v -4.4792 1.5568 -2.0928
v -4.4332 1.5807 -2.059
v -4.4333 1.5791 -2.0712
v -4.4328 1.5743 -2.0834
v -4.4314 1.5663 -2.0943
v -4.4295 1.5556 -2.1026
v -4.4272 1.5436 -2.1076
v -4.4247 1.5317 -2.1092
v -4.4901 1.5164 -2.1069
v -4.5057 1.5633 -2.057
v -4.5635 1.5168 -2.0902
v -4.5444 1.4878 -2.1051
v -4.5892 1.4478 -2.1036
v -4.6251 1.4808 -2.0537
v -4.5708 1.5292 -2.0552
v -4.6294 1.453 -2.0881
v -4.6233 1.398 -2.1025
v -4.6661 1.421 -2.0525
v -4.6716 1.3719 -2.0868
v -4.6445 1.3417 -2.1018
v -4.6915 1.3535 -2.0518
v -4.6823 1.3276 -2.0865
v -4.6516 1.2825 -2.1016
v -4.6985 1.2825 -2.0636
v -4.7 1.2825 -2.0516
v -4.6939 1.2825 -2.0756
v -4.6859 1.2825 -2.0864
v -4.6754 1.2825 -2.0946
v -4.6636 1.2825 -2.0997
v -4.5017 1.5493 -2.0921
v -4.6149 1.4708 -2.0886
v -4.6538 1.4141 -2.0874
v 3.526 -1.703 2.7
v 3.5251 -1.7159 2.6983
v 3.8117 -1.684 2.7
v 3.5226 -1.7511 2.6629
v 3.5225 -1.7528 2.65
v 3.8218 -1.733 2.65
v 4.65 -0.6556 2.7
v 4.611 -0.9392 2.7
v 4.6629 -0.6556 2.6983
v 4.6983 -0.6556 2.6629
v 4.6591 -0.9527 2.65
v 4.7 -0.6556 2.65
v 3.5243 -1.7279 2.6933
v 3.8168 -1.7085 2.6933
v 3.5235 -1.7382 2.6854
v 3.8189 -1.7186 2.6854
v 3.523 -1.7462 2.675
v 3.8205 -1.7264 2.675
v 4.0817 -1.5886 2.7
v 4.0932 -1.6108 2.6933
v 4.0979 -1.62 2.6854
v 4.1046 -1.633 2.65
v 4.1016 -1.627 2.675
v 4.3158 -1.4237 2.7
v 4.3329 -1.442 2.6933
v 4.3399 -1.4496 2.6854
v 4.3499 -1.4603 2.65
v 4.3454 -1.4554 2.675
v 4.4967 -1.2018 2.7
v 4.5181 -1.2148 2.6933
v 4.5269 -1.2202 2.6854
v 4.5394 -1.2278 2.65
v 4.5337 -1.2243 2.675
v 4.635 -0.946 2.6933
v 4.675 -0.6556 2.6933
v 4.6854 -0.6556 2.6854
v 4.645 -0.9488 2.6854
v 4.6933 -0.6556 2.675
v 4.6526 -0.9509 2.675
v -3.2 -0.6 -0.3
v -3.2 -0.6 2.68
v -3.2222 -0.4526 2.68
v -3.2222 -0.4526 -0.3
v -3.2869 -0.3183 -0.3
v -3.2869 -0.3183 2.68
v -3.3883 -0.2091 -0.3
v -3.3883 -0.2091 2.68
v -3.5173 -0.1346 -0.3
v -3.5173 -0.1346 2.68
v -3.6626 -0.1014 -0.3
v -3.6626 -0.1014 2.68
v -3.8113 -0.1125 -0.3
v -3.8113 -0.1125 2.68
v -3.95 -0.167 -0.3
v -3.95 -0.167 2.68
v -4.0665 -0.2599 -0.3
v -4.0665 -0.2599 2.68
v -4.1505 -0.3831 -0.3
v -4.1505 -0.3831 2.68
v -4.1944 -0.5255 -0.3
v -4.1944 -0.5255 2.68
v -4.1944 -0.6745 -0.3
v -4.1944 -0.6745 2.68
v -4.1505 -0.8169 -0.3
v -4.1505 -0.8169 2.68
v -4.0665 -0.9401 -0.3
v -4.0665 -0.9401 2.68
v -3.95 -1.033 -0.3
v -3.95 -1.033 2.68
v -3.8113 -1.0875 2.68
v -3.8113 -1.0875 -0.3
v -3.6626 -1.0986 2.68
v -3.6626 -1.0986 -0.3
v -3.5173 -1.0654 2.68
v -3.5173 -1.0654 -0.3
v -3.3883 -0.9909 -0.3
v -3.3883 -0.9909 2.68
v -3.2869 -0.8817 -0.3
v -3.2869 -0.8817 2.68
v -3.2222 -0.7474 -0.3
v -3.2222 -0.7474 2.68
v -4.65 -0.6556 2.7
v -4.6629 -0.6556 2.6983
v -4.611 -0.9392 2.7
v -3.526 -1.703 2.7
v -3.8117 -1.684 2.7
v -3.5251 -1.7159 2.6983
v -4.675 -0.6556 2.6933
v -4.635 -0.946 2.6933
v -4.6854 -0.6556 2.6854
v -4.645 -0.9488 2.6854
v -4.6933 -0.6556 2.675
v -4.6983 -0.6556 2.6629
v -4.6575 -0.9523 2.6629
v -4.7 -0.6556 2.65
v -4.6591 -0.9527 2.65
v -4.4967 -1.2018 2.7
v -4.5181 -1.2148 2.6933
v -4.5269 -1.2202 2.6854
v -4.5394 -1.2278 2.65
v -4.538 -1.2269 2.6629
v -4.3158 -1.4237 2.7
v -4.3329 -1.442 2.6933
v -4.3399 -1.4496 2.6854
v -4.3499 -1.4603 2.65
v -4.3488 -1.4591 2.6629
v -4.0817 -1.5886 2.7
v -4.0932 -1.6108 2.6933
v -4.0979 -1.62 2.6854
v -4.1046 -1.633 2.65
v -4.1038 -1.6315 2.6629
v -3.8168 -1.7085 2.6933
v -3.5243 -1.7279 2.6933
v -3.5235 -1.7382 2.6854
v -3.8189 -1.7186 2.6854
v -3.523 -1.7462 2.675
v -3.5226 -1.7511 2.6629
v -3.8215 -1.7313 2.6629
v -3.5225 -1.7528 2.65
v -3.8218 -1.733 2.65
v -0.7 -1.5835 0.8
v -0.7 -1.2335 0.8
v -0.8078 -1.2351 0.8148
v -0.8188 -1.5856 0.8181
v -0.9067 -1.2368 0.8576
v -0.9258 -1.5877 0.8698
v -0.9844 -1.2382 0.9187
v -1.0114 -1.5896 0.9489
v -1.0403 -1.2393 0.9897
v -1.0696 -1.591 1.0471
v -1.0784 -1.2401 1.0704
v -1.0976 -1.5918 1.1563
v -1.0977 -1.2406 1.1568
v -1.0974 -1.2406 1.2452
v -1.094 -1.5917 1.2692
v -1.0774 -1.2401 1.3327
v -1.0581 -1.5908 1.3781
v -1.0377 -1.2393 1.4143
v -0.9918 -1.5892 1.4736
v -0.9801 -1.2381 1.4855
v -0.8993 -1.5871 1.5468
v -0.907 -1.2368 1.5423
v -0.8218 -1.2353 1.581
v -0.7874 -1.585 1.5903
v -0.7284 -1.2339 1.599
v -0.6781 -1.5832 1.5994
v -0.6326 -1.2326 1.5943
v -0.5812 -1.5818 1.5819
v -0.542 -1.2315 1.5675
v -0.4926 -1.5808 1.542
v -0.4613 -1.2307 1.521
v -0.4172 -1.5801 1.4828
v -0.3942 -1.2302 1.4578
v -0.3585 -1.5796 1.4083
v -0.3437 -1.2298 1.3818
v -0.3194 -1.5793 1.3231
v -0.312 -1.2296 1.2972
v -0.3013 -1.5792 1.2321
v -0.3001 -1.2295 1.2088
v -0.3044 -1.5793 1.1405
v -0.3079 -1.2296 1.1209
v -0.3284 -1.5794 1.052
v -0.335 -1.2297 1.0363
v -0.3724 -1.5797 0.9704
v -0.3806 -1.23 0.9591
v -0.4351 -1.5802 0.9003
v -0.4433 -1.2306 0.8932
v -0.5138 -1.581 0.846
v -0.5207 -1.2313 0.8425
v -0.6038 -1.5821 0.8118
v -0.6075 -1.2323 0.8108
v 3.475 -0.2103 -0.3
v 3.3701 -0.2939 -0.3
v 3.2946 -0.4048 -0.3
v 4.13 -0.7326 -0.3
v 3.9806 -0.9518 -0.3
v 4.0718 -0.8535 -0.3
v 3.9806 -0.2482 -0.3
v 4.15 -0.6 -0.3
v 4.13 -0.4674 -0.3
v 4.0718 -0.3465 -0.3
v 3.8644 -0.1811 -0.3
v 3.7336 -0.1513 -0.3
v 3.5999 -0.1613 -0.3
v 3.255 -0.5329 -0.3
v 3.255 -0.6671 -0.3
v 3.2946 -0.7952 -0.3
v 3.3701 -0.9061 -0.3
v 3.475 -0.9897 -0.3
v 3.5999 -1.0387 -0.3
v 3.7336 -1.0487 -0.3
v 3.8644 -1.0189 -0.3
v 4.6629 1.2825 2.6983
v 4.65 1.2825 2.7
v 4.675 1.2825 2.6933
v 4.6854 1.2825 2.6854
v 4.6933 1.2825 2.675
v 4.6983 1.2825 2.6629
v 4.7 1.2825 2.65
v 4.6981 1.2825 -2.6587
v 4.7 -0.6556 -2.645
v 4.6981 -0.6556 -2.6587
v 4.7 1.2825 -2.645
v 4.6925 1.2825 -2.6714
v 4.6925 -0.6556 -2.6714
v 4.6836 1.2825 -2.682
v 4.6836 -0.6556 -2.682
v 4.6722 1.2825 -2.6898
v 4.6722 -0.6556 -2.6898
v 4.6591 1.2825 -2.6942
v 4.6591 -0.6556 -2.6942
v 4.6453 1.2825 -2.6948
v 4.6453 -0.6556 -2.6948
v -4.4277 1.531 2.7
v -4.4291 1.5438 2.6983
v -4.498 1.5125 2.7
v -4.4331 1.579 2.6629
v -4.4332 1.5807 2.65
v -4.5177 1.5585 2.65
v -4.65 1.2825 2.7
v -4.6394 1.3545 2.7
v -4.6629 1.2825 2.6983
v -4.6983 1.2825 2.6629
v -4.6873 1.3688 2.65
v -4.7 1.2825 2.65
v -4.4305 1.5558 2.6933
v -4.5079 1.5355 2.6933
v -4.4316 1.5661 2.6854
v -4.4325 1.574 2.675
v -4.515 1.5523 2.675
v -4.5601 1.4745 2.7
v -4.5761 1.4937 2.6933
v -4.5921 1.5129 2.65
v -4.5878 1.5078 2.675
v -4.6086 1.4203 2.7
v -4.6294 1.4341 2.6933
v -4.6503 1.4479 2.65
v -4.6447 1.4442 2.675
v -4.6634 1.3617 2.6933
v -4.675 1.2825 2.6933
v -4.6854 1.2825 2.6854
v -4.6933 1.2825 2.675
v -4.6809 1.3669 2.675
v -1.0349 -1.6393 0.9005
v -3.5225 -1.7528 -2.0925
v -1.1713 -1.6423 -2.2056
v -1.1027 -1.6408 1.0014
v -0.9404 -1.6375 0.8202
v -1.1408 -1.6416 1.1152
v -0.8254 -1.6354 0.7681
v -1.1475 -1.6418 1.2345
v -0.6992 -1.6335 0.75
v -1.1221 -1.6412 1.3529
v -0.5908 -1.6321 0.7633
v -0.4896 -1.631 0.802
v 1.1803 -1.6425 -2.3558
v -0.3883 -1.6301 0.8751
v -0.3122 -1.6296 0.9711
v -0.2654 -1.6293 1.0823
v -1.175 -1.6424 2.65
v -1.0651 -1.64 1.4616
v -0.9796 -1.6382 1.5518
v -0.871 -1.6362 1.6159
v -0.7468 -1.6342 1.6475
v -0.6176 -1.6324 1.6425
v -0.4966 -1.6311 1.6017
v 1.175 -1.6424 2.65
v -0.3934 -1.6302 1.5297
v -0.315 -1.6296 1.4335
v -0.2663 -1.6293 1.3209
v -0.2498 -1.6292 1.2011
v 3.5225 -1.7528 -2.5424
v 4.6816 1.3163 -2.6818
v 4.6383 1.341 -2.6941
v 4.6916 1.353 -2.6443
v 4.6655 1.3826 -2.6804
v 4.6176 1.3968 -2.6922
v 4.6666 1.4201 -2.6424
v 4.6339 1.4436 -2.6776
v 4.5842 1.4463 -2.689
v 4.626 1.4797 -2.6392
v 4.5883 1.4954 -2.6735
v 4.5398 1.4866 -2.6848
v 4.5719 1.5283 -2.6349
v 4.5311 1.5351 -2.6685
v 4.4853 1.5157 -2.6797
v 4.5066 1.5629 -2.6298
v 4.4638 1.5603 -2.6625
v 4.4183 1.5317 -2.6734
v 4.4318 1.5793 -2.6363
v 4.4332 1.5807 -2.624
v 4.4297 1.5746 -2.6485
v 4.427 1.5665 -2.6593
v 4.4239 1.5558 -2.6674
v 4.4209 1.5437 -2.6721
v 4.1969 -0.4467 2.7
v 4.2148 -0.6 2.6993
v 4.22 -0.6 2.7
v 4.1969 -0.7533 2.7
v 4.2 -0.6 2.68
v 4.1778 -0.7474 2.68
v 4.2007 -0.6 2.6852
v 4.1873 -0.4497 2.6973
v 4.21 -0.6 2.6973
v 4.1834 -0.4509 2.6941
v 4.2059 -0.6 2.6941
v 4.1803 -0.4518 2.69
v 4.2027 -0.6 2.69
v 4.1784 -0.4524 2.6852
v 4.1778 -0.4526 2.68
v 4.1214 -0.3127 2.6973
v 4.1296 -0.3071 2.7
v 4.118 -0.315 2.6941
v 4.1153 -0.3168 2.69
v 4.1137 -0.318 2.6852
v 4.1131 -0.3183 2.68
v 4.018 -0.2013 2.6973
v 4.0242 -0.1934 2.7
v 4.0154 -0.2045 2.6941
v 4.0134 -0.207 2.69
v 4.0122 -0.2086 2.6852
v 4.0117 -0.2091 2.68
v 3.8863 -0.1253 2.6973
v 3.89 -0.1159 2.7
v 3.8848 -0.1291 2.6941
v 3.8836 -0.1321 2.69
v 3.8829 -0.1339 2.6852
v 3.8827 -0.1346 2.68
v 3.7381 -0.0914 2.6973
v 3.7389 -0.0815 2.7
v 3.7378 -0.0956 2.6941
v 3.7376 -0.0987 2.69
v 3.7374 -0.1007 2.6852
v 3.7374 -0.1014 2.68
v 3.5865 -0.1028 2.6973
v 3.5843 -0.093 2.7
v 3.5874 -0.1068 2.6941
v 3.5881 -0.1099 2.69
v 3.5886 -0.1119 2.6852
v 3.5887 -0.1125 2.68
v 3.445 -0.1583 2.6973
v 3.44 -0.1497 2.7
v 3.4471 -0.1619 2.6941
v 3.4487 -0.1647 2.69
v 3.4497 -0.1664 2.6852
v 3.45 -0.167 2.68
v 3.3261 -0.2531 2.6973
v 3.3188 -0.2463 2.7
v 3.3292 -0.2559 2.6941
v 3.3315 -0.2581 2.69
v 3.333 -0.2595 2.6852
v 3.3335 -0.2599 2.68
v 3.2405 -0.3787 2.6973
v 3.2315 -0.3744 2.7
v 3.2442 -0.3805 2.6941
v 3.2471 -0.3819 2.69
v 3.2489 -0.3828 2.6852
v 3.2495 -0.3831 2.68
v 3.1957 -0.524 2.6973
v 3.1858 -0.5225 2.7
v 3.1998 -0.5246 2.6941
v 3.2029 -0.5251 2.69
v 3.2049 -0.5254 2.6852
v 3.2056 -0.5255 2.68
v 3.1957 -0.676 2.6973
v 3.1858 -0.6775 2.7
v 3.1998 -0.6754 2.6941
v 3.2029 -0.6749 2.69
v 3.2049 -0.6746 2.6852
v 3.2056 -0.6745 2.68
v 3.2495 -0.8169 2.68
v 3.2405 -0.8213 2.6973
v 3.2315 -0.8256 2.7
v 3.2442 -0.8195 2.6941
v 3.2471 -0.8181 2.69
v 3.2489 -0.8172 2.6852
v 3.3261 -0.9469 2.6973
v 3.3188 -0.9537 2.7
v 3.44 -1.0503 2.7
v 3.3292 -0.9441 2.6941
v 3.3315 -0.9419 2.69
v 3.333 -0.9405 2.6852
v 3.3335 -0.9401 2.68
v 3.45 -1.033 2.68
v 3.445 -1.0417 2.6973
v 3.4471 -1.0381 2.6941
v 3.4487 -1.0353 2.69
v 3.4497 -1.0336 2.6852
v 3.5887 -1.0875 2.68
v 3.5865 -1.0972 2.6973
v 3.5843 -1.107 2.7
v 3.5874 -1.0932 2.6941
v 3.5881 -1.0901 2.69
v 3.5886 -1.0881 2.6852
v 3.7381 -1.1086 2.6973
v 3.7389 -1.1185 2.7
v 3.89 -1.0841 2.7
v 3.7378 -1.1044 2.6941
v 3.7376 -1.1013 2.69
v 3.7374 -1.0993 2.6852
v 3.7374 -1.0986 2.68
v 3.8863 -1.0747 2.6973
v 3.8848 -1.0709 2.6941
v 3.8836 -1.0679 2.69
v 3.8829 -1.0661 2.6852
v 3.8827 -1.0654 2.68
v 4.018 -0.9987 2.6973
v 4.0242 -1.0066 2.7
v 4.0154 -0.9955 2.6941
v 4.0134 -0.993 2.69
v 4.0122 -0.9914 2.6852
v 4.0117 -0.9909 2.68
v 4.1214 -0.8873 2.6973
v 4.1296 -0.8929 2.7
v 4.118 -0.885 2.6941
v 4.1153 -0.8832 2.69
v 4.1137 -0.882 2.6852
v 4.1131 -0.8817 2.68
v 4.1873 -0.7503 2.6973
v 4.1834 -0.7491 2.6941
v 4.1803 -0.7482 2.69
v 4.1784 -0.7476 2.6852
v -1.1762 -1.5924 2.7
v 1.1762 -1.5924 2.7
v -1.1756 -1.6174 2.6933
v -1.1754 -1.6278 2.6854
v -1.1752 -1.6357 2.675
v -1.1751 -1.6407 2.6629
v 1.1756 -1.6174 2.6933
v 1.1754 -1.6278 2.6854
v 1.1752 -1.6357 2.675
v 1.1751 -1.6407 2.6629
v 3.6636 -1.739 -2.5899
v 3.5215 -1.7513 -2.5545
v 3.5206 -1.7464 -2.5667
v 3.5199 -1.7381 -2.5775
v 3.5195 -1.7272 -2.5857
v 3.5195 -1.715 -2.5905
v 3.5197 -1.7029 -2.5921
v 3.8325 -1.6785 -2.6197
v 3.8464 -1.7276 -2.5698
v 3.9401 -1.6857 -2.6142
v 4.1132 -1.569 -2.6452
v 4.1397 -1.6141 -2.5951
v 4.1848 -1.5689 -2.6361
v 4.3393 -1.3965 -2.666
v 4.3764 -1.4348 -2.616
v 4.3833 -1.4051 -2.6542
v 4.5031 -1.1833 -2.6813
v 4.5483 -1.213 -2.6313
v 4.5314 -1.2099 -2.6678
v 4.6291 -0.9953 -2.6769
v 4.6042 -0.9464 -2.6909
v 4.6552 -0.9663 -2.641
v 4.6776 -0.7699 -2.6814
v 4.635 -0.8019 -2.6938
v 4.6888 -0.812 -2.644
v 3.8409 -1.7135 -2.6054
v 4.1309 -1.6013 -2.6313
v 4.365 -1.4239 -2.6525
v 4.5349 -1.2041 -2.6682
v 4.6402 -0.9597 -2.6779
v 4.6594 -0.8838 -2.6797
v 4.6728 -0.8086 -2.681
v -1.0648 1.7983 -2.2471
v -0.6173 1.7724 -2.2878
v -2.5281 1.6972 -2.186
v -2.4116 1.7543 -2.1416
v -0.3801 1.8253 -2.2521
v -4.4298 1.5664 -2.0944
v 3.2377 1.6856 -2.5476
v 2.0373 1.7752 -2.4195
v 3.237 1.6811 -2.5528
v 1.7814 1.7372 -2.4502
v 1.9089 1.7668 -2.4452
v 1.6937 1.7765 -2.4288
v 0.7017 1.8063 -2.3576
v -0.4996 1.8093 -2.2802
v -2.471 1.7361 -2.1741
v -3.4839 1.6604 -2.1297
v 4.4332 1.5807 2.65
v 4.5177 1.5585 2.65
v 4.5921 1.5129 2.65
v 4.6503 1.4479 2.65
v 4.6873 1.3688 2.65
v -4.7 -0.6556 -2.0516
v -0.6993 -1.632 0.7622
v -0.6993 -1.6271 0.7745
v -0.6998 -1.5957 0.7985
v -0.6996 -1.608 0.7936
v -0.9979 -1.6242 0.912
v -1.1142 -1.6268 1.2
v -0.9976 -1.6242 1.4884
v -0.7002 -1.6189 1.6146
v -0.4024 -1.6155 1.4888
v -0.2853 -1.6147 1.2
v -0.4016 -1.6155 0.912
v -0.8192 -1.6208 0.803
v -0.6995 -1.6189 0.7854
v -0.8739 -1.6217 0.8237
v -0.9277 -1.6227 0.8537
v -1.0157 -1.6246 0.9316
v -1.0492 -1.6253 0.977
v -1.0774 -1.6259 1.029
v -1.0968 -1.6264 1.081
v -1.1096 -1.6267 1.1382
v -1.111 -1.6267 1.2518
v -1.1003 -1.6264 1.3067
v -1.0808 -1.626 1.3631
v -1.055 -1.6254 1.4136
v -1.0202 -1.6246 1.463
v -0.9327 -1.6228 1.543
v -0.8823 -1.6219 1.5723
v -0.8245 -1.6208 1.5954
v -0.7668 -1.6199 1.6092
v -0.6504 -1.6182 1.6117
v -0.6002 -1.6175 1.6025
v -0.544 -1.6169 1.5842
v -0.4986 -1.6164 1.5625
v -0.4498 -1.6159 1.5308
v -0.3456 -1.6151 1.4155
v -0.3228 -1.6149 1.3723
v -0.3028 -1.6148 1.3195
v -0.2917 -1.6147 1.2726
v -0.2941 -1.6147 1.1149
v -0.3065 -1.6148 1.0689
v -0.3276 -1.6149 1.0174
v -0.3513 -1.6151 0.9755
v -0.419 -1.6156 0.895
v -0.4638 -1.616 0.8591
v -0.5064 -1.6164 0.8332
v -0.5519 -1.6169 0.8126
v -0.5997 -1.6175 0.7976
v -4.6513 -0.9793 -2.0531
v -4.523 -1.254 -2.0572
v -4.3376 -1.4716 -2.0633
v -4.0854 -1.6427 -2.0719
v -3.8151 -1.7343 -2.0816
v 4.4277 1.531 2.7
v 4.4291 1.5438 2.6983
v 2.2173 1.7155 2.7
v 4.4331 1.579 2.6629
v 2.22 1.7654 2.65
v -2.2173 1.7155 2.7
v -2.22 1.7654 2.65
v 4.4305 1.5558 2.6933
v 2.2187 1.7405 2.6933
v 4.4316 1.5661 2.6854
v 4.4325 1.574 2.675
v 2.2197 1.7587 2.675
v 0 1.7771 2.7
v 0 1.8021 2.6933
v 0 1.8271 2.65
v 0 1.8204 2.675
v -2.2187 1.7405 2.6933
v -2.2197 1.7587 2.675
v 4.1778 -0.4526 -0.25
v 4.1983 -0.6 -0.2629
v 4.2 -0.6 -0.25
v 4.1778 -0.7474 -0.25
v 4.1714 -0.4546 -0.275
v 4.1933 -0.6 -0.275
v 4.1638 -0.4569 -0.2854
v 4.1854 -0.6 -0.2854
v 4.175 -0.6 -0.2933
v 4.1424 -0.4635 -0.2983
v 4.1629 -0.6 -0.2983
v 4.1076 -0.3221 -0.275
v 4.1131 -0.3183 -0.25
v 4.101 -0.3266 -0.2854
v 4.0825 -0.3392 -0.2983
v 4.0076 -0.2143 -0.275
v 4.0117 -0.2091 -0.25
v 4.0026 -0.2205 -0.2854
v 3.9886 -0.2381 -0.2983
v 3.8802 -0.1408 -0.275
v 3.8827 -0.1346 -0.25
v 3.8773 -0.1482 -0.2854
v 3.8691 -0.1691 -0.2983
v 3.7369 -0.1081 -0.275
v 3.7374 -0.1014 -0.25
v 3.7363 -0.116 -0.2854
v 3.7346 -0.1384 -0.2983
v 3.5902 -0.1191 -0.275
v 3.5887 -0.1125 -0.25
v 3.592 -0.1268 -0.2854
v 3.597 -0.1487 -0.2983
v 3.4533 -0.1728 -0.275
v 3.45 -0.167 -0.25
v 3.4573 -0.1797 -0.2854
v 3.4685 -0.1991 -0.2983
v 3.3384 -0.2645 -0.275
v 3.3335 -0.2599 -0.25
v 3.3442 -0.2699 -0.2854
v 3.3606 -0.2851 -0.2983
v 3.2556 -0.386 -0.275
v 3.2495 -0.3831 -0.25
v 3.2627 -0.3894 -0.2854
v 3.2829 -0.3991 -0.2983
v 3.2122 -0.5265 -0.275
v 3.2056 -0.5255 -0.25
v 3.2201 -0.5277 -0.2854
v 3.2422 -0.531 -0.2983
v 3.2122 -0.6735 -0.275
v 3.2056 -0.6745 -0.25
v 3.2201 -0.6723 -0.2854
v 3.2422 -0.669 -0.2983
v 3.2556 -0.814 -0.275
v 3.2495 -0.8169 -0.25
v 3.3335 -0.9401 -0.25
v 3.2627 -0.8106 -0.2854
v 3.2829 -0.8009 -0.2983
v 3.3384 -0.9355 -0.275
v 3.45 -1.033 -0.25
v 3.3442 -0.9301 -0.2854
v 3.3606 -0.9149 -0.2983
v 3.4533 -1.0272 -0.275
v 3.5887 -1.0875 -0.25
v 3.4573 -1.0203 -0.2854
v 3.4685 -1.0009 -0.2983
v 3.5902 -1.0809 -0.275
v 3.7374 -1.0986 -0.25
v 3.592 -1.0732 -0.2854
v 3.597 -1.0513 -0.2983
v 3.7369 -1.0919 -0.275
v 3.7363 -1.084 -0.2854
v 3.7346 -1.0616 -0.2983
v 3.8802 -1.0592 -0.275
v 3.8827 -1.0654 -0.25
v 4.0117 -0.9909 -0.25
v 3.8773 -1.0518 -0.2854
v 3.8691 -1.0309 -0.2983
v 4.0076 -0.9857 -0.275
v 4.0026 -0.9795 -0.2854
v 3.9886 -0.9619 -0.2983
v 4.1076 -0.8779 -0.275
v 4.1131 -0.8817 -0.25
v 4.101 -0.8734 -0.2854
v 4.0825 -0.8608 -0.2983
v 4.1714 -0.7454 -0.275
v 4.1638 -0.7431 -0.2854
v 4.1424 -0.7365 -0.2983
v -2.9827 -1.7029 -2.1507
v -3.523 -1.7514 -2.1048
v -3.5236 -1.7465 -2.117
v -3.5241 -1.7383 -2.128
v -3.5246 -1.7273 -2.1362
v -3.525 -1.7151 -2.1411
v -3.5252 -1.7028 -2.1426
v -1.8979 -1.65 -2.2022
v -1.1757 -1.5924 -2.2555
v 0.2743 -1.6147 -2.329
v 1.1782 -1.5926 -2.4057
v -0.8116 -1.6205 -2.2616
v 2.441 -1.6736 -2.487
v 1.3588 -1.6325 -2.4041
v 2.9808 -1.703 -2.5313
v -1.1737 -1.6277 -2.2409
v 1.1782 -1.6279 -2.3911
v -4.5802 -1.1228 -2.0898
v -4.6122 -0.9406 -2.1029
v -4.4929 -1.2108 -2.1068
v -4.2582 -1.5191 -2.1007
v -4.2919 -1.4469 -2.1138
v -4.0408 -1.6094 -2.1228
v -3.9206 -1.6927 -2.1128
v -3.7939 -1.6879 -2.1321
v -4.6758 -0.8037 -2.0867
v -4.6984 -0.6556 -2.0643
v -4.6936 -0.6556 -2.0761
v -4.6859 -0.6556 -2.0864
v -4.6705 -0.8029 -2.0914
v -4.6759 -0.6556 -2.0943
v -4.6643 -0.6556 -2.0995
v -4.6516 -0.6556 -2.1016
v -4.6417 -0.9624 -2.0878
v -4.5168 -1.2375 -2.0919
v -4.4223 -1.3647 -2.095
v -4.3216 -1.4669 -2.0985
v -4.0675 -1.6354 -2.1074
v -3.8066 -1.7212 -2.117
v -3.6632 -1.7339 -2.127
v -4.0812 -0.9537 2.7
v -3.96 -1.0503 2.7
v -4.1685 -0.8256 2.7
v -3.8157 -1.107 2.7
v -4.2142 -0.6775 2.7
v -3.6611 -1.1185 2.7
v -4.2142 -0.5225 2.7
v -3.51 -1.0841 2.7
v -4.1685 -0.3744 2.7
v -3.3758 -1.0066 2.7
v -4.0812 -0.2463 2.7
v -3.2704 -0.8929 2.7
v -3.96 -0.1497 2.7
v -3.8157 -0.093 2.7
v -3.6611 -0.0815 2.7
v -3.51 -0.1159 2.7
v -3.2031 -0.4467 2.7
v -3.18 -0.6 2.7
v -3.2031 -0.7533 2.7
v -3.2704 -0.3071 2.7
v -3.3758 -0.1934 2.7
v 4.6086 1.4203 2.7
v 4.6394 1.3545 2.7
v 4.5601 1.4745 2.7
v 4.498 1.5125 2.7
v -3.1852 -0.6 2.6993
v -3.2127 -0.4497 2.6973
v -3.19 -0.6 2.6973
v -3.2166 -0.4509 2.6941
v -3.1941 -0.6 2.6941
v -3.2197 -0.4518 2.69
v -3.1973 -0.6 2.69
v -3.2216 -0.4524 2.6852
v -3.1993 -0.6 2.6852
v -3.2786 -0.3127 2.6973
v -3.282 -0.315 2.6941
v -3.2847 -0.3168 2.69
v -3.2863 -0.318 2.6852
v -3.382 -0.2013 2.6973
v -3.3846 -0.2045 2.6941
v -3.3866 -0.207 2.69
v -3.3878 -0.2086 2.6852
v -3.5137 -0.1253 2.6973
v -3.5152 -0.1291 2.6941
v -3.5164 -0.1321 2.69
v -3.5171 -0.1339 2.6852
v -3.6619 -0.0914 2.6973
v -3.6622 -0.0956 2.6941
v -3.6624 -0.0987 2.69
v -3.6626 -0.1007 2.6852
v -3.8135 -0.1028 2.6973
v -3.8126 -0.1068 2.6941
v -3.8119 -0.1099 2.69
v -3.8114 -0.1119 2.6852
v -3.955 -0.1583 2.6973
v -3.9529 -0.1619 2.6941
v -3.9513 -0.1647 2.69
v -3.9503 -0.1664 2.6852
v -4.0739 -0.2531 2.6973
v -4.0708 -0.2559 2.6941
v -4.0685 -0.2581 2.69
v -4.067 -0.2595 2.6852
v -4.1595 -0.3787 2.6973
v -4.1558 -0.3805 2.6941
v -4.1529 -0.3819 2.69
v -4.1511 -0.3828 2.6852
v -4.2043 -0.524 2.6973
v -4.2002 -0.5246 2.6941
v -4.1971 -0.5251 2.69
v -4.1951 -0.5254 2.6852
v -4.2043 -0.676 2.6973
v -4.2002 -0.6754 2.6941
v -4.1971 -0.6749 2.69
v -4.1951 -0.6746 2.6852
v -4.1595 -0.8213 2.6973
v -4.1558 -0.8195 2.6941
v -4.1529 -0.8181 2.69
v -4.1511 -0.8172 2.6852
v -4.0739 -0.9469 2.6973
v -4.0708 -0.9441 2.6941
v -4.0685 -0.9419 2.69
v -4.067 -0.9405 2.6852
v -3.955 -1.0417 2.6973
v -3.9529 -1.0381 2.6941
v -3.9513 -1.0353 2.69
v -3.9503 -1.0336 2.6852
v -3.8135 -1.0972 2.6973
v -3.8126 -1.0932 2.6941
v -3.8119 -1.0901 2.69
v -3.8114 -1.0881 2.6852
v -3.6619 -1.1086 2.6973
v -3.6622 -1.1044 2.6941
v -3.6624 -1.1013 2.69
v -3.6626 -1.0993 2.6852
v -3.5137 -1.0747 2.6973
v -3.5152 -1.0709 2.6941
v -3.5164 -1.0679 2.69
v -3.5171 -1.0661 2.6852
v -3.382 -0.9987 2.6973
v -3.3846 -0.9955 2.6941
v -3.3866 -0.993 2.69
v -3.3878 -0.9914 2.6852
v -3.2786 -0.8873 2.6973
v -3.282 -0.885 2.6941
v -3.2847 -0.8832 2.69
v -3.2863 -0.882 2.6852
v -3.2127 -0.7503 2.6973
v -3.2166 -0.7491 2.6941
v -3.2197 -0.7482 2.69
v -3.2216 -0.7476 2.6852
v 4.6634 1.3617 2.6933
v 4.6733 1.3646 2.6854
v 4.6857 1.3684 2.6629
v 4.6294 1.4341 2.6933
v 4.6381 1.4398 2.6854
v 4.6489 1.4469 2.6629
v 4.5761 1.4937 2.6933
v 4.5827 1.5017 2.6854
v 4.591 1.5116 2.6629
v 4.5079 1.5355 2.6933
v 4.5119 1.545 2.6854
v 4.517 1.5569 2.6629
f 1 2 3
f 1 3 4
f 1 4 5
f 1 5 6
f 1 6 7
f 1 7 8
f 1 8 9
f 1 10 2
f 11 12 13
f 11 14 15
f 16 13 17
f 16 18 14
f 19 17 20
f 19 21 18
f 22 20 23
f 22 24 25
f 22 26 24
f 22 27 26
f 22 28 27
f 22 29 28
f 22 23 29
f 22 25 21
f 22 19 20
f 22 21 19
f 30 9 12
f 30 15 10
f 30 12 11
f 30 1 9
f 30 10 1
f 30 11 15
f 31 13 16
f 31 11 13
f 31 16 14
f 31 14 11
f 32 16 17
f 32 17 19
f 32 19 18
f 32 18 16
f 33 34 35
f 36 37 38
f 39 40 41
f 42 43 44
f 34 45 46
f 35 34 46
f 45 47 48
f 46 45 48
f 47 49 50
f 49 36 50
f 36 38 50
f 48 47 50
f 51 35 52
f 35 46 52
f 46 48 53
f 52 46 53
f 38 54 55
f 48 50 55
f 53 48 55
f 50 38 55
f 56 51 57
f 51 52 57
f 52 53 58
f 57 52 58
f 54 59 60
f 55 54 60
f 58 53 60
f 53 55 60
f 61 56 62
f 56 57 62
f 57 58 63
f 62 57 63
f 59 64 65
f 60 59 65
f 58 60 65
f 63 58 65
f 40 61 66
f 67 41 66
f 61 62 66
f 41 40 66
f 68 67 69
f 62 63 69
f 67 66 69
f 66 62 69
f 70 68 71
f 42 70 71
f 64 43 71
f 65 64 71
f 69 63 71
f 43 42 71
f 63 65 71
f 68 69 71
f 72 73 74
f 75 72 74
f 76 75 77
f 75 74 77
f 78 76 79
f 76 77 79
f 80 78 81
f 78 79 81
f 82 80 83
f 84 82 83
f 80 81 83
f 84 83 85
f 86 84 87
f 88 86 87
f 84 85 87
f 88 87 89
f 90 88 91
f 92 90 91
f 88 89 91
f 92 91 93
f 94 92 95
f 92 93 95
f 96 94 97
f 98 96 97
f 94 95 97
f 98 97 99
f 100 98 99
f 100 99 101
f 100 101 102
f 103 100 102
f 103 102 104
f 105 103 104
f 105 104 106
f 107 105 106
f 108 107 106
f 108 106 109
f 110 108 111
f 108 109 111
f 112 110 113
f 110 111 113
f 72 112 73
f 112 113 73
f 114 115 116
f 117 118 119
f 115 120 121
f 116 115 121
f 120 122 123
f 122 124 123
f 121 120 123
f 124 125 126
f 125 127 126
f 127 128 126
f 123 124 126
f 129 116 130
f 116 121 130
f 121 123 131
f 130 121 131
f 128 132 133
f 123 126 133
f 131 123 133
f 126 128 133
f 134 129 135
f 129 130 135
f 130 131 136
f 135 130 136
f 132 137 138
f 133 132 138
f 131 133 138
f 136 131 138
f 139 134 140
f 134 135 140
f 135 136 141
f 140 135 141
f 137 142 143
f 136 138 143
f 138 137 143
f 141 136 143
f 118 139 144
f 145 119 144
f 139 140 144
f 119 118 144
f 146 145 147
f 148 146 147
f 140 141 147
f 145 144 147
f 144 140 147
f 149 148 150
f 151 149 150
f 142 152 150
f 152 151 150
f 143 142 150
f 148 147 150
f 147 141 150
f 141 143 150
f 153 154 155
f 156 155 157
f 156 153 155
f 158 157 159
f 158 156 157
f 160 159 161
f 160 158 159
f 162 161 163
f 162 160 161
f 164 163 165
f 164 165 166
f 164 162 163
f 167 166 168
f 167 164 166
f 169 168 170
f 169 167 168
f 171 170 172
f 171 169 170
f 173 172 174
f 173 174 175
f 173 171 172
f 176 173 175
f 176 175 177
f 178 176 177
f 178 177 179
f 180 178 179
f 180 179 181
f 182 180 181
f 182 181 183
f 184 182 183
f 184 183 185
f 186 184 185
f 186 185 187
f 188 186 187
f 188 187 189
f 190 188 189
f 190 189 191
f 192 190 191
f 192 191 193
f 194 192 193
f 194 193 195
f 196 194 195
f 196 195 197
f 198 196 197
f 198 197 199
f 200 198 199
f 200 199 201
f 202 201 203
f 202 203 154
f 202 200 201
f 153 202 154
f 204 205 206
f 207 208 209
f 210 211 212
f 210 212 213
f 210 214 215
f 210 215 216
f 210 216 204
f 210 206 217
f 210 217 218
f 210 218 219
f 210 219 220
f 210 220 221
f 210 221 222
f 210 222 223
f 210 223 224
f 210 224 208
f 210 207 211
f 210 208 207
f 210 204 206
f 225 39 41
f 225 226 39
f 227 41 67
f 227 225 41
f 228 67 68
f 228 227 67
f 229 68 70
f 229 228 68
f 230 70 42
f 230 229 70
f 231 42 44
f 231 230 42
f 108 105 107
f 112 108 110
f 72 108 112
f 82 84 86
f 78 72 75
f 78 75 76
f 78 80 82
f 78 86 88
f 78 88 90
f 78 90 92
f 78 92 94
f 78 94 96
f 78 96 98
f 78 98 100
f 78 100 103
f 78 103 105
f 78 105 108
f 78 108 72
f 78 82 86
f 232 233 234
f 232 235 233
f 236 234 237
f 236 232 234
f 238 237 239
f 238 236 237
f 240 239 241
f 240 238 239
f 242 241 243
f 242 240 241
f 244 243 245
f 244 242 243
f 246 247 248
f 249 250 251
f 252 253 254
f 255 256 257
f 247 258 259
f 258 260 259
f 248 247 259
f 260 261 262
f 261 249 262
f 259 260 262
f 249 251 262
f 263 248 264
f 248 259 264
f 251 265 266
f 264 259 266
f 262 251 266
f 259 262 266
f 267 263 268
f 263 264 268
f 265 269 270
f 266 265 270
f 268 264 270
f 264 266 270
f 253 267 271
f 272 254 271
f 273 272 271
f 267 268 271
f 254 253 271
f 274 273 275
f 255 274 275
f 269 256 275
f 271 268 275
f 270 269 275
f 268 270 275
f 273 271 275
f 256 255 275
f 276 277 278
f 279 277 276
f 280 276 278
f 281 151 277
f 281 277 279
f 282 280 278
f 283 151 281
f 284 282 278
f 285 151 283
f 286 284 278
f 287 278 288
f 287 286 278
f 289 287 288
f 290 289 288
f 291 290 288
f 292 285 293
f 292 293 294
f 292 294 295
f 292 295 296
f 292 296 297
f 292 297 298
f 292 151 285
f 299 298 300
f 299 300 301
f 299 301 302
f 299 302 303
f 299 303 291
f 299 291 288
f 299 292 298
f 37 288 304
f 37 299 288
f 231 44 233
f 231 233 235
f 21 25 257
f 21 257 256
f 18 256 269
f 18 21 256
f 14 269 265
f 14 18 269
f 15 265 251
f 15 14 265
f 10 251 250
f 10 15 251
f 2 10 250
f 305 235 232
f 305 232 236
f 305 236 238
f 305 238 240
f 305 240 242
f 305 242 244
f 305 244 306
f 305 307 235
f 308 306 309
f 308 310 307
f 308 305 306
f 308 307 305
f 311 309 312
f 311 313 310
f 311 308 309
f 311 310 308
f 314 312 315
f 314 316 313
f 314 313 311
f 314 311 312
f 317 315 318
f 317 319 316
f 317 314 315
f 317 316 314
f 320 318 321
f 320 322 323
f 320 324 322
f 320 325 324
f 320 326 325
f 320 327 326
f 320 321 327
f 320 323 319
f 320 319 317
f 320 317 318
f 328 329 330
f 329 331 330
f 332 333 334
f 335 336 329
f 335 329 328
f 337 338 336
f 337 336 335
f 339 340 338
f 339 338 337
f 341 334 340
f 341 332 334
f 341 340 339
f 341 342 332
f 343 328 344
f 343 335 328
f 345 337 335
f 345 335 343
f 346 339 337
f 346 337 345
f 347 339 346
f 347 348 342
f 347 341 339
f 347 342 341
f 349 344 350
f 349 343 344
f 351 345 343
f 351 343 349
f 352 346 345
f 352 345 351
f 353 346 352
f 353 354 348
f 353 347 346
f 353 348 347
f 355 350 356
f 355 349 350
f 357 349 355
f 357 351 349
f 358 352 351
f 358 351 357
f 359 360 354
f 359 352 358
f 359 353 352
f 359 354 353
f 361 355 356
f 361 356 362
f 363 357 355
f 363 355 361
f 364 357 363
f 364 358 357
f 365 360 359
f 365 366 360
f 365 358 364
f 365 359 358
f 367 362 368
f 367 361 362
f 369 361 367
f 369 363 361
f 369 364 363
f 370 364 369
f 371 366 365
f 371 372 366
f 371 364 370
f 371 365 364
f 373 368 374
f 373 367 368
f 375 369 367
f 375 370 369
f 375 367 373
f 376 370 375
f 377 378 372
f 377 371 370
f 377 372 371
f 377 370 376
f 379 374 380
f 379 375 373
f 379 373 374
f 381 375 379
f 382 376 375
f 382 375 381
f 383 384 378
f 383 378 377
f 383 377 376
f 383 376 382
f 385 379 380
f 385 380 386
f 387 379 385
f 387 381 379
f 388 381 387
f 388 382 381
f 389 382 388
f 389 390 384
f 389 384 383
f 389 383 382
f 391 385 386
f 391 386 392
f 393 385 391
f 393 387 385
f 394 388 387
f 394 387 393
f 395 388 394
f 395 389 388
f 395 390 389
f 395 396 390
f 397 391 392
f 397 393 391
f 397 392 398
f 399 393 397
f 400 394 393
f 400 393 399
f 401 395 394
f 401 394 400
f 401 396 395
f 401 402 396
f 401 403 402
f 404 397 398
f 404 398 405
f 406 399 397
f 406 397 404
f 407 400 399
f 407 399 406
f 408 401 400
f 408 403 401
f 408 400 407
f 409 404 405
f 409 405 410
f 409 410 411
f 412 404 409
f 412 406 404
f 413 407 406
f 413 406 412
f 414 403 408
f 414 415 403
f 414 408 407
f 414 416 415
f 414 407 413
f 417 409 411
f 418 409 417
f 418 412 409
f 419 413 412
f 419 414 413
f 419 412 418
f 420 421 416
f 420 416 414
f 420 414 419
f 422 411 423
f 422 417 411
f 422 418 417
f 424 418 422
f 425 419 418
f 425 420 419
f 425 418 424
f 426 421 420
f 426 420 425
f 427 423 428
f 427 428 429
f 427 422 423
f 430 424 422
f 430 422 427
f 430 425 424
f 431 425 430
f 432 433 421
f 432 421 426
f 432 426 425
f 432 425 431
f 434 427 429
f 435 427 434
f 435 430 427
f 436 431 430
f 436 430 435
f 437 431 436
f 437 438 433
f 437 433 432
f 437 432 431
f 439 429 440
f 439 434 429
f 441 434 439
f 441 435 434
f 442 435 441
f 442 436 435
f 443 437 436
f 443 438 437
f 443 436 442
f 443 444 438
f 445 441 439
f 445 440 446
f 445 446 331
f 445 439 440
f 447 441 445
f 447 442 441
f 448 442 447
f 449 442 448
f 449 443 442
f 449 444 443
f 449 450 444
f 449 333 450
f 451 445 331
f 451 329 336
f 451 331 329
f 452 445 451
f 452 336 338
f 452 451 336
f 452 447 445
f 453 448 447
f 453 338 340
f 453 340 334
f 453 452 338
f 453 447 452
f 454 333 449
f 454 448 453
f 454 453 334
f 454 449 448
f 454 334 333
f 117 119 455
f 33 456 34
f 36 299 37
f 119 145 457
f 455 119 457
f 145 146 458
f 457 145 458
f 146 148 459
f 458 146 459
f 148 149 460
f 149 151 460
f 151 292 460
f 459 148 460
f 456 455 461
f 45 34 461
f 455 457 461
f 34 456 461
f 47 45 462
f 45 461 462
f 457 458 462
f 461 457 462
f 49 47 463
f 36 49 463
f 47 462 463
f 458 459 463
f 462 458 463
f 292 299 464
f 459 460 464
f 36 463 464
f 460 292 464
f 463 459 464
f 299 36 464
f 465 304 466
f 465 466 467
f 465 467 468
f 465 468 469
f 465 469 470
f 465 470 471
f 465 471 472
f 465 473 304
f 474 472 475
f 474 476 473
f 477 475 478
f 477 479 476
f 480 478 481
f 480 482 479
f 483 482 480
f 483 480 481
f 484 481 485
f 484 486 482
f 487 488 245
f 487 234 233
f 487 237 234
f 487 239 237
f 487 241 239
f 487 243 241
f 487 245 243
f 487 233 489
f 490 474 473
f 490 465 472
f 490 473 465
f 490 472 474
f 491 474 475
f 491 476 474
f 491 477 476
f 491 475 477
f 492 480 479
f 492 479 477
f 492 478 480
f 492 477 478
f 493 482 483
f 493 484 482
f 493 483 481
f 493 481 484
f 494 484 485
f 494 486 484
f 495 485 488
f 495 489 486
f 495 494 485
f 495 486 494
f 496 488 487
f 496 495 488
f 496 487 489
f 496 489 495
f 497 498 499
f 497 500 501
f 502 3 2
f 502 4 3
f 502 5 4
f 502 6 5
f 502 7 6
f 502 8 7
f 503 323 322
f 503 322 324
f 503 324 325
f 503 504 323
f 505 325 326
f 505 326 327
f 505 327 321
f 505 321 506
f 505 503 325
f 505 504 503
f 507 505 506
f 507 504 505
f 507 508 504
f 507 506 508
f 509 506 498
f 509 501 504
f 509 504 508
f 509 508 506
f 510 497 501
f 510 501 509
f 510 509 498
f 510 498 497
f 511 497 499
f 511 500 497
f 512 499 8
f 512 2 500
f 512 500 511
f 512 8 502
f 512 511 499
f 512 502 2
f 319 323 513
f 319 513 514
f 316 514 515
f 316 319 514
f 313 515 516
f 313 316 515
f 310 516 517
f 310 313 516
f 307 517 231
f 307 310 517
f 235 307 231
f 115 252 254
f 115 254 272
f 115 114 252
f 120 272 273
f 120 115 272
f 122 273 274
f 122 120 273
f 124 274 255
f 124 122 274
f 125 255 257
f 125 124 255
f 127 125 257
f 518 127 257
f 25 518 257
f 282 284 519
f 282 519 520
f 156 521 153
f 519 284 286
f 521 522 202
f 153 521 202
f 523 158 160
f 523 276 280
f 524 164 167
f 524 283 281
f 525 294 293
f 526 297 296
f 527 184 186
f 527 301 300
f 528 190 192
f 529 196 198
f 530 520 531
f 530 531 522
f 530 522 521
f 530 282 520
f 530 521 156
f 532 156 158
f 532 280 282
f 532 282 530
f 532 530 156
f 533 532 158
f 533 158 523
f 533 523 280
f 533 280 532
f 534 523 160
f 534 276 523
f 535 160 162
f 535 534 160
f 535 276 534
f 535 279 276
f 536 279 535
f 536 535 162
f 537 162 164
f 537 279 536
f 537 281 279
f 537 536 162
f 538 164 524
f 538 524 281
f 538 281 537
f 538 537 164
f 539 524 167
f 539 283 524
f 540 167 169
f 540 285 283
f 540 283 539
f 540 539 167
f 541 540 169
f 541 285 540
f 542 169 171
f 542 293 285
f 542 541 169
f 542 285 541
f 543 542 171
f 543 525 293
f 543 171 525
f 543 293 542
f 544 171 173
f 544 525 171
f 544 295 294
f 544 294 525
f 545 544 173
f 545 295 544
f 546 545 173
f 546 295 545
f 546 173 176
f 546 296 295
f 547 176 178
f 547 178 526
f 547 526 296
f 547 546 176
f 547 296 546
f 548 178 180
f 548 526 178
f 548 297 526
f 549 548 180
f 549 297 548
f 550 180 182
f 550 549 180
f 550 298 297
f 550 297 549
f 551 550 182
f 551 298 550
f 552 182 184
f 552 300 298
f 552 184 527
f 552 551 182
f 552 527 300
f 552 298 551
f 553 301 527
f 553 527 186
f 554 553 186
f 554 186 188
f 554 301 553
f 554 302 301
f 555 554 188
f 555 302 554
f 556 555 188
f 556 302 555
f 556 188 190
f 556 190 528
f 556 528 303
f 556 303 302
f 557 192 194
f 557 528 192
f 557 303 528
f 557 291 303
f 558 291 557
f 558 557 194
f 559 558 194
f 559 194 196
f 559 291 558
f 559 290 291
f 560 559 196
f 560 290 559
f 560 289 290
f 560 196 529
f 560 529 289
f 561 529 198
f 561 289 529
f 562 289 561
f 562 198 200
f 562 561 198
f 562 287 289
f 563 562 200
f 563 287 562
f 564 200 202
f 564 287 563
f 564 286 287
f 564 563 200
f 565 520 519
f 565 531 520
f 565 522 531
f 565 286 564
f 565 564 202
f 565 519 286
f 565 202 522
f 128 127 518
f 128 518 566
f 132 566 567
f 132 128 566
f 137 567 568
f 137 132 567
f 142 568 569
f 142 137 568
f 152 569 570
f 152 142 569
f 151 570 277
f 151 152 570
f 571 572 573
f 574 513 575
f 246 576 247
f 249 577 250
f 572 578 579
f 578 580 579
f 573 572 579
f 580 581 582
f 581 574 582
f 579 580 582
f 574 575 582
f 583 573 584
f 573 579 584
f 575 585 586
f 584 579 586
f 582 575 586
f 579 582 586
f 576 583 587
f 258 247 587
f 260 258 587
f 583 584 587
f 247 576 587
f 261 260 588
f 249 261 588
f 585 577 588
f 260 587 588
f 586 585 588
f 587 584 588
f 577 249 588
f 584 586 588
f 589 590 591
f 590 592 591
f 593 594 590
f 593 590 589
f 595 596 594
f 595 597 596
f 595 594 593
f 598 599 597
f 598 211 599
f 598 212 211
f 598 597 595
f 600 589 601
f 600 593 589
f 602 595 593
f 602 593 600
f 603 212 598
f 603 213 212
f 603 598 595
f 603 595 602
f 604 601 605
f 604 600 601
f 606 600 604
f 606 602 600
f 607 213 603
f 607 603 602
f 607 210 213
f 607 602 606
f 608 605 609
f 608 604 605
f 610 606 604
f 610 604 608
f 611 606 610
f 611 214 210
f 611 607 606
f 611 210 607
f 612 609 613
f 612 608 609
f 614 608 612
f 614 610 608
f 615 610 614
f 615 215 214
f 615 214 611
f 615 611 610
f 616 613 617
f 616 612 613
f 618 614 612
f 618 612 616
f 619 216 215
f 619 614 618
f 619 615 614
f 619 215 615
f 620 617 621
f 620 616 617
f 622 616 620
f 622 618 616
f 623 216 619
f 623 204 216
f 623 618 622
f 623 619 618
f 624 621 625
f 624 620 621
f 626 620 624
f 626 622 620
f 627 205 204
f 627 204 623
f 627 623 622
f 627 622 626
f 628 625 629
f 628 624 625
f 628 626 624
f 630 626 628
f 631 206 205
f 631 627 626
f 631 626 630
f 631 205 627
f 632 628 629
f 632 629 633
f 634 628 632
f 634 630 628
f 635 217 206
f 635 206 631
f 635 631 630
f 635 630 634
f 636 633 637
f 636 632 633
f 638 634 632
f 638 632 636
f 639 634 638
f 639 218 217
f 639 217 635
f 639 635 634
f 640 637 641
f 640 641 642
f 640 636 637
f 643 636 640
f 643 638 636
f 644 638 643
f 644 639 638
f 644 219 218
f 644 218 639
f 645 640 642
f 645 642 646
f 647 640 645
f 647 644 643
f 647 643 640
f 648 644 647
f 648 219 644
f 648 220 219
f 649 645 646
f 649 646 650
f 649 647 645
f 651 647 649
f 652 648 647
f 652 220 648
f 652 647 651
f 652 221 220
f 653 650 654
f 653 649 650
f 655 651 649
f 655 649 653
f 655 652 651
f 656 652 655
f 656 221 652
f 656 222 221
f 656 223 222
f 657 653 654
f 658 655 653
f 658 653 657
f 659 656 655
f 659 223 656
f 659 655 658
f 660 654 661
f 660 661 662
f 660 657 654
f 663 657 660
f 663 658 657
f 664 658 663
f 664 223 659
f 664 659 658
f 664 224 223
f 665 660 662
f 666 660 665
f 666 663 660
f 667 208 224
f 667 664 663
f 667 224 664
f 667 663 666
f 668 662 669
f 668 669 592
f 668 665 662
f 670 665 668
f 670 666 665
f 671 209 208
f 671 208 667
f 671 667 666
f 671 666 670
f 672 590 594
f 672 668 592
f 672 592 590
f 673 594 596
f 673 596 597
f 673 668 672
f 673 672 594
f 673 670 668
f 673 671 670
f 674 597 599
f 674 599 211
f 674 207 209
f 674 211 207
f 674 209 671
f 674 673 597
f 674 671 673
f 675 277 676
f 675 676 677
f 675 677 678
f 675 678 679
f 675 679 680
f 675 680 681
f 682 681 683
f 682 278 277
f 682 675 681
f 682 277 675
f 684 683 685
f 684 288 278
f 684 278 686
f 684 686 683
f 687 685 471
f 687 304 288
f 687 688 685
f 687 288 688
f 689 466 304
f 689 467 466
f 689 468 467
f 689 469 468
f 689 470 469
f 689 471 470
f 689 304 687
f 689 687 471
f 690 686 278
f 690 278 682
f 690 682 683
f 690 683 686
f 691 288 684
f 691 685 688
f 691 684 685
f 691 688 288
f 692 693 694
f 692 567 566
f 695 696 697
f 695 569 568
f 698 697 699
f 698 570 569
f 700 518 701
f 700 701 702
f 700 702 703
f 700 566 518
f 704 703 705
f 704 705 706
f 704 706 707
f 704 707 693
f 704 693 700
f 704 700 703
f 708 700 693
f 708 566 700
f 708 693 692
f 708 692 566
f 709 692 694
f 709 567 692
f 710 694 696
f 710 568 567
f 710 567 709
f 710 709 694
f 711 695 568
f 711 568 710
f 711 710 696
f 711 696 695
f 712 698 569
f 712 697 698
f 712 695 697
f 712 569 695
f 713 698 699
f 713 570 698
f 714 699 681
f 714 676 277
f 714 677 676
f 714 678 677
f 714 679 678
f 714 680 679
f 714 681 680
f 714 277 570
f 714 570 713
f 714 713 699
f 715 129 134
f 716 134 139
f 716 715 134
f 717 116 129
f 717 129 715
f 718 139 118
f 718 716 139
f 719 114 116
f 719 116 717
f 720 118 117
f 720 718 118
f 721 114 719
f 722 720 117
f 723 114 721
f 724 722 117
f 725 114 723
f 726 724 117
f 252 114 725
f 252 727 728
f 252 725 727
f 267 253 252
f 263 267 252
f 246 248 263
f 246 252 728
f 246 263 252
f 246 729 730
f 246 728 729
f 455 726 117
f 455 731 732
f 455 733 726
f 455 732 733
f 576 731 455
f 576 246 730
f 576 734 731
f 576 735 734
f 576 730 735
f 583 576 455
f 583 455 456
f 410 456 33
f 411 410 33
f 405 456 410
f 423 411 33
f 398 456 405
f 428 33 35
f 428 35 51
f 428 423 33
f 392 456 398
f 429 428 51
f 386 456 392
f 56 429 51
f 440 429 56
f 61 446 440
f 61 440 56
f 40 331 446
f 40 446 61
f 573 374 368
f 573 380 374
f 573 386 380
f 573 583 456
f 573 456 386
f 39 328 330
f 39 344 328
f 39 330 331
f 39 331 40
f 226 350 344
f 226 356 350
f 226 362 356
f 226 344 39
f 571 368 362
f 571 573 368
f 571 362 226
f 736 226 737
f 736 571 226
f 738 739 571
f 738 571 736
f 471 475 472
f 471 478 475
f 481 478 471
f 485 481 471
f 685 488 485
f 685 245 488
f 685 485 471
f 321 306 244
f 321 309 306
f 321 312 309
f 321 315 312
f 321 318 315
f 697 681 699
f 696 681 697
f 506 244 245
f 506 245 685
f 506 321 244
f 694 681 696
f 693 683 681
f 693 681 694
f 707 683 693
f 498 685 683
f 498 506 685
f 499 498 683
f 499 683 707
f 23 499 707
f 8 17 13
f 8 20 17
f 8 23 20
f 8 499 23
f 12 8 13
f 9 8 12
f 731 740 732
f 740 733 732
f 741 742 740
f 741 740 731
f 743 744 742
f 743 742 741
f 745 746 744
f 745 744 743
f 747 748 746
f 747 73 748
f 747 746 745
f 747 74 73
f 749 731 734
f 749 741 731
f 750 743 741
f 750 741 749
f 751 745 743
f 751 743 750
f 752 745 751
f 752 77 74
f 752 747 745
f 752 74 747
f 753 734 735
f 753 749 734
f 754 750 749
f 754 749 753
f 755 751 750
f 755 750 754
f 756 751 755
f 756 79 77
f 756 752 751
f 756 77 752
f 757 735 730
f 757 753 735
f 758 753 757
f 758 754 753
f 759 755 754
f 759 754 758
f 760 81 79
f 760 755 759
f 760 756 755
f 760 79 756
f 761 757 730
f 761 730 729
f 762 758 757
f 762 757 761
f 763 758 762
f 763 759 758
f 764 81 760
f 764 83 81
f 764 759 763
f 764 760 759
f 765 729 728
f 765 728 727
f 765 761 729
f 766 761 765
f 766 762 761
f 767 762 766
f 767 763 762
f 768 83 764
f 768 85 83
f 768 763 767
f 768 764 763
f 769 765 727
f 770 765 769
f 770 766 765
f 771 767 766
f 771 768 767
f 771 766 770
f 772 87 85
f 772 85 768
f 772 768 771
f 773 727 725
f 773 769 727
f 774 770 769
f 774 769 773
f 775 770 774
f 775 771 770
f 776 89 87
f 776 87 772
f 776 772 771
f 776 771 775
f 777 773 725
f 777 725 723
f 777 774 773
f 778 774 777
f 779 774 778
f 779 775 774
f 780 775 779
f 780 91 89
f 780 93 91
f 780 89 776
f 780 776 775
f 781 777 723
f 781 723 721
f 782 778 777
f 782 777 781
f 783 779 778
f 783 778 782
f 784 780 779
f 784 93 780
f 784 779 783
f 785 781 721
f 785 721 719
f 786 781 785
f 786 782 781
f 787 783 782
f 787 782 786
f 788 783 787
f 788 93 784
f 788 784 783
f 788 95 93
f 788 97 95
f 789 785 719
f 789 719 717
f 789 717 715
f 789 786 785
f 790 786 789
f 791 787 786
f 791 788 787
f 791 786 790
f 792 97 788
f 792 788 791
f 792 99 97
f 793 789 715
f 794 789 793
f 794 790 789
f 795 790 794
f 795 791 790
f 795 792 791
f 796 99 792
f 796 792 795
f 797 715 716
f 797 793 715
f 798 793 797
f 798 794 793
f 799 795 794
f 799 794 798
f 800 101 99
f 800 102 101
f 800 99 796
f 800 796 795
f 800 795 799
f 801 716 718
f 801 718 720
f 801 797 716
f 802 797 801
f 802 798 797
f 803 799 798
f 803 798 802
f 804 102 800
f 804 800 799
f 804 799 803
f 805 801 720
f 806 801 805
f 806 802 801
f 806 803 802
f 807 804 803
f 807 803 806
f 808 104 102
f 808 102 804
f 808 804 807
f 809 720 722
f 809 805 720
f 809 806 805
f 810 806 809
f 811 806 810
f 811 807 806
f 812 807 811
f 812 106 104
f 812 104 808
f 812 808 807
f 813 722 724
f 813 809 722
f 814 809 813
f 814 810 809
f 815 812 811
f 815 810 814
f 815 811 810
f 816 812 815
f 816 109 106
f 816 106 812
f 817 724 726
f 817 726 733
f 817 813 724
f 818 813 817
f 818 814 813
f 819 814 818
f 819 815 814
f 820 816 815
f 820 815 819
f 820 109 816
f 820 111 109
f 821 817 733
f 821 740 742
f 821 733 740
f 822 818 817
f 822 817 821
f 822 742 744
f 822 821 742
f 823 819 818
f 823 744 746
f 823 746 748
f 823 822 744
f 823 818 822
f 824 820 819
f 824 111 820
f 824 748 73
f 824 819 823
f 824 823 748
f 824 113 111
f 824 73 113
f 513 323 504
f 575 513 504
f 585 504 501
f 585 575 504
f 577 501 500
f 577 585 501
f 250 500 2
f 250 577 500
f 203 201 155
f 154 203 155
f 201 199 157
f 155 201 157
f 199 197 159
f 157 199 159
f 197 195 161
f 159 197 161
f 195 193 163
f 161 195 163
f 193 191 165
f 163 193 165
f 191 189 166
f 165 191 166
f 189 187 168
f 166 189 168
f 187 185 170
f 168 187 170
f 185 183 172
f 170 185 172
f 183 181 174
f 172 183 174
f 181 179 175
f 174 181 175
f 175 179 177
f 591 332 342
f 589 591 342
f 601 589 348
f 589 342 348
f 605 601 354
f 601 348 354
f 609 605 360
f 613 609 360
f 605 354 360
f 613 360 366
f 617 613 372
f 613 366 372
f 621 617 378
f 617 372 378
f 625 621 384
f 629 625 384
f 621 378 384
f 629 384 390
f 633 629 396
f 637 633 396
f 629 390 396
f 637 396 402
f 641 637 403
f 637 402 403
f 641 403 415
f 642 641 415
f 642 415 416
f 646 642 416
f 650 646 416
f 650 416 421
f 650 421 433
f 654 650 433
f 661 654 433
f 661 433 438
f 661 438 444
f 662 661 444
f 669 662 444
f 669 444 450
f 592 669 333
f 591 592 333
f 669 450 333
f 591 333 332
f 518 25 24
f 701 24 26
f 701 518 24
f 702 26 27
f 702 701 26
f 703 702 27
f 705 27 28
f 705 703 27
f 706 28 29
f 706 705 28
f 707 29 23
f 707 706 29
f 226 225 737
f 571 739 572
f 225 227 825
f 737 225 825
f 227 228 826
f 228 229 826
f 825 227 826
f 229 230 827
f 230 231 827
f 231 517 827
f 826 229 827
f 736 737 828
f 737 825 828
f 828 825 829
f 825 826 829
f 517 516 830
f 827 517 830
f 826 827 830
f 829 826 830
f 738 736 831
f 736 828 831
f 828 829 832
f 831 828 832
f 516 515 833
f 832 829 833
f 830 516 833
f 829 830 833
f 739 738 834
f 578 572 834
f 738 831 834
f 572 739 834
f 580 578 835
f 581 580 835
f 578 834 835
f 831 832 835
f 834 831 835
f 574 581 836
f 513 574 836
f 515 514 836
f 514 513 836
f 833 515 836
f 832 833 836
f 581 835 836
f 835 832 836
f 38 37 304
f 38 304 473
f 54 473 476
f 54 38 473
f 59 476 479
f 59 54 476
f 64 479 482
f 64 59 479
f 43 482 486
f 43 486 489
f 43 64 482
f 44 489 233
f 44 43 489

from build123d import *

# Parameters (mm, degrees)
SKETCH1_W               = 9.4
SKETCH1_H               = 3.7
BOSS_EXTRUDE1_DEPTH     = 2.7
CUT_EXTRUDE1_DEPTH      = 15.2
FILLET1_R               = 1.1
FILLET2_R               = 0.3
SKETCH3_R               = 0.5
CUT_EXTRUDE2_DEPTH      = 3
FILLET4_R               = 0.02
CUT_EXTRUDE3_DEPTH      = 5
FILLET5_R               = 0.05
CUT_EXTRUDE4_REACH      = 17.72
CUT_EXTRUDE4_END_RADIUS = 50.4
CUT_EXTRUDE4_START      = -10
SKETCH5_R               = 0.4
FILLET6_R               = 0.05


with BuildPart() as part:
    # Sketch1 → Boss-Extrude1 (new, symmetric)
    with BuildSketch(Plane.XY):
        Rectangle(SKETCH1_W, SKETCH1_H)
    extrude(amount=BOSS_EXTRUDE1_DEPTH, both=True)

    # Sketch2 → Cut-Extrude1 (cut)
    with BuildSketch(Plane.XY.offset(2.7)):
        with BuildLine():
            Line((-4.7, 1.55), (-7.120690005, 4.011417256))
            Line((-7.120690005, 4.011417256), (5.535860742, 3.886722174))
            Line((5.535860742, 3.886722174), (4.7, 1.55))
            ThreePointArc((4.7, 1.55), (0, 1.827084699), (-4.7, 1.55))
        make_face()
        with BuildLine():
            Line((4.7, -1.85), (0.350623614, -3.782025322))
            Line((0.350623614, -3.782025322), (-4.7, -1.85))
            ThreePointArc((-4.7, -1.85), (0, -1.628609864), (4.7, -1.85))
        make_face()
    extrude(amount=-CUT_EXTRUDE1_DEPTH, mode=Mode.SUBTRACT)

    # Fillet1
    fillet1_edges = [part.edges().sort_by_distance(p)[0] for p in [
        (4.7, -1.85, 0),
        (-4.7, -1.85, 0),
    ]]
    fillet(fillet1_edges, radius=FILLET1_R)

    # Fillet2
    fillet2_edges = [part.edges().sort_by_distance(p)[0] for p in [
        (4.7, 1.55, 0),
        (-4.7, 1.55, 0),
    ]]
    fillet(fillet2_edges, radius=FILLET2_R)

    # Sketch3 → Cut-Extrude2 (cut)
    with BuildSketch(Plane.XY.offset(2.7)):
        with Locations((3.7, -0.6)):
            Circle(SKETCH3_R)
        with Locations((-3.7, -0.6)):
            Circle(SKETCH3_R)
    extrude(amount=-CUT_EXTRUDE2_DEPTH, mode=Mode.SUBTRACT)

    # Fillet4
    fillet4_edges = [part.edges().sort_by_distance(p)[0] for p in [
        (3.2, -0.6, 2.7),
        (-4.2, -0.6, 2.7),
    ]]
    fillet(fillet4_edges, radius=FILLET4_R)

    # Sketch4 → Cut-Extrude3 (cut, symmetric)
    with BuildSketch(Plane(origin=(0, 0, 0), x_dir=(1, 0, 0), z_dir=(0, 1, 0))):
        with BuildLine():
            Line((-4.7, 2.1), (-6.612719149, 3.613907535))
            Line((-6.612719149, 3.613907535), (6.420677859, 4.474089961))
            Line((6.420677859, 4.474089961), (4.7, 2.7))
            ThreePointArc((4.7, 2.7), (0.004710726, 2.326198627), (-4.7, 2.1))
        make_face()
    extrude(amount=CUT_EXTRUDE3_DEPTH, both=True, mode=Mode.SUBTRACT)

    # Fillet5
    fillet5_edges = [part.edges().sort_by_distance(p)[0] for p in [
        (4.7, 0.3134624, -2.7),
        (4.7, 0.3134624, 2.7),
        (0, -1.628609864, 2.7),
        (-4.349918456, -1.460327621, 2.7),
        (4.349918456, -1.460327621, 2.7),
        (0, 1.827084699, 2.7),
        (-4.7, 0.3134624, 2.7),
        (-4.623578634, 1.482534062, 2.7),
        (4.623578634, 1.482534062, 2.7),
        (3.2, -0.6, -0.3),
        (-4.623553452, 1.482562201, -2.102492735),
        (4.349071598, -1.461115949, -2.666925627),
        (-4.349757648, -1.460477444, -2.11174073),
        (4.623384041, 1.482751346, -2.692708087),
        (0.004177998, 1.827084481, -2.326164624),
        (0.002641899, -1.628609931, -2.326066603),
        (-4.7, 0.3134624, -2.1),
    ]]
    fillet(fillet5_edges, radius=FILLET5_R)

    # Cut-Extrude4: up to this cylinder (the profile starts inside it)
    cut_extrude4_end = Plane(origin=(0, -51.628609864, 1.2), z_dir=(0, 0, 1)) * Cylinder(CUT_EXTRUDE4_END_RADIUS, 137.24, mode=Mode.PRIVATE)
    # Sketch5 → Cut-Extrude4 (cut, up to the surface)
    with BuildSketch(Plane(origin=(0, 0, 0), x_dir=(1, 0, 0), z_dir=(0, 1, 0)).offset(CUT_EXTRUDE4_START), mode=Mode.PRIVATE) as cut_extrude4_sk1:
        with Locations(Location((-0.7, -1.2, 0), (0, 0, 90))):
            Circle(SKETCH5_R)
    cut_extrude4_tool1 = extrude(cut_extrude4_sk1.sketch, amount=CUT_EXTRUDE4_REACH, mode=Mode.PRIVATE) & cut_extrude4_end
    add(cut_extrude4_tool1.solids().sort_by_distance((-0.7, -10, 1.2))[0], mode=Mode.SUBTRACT)

    # Fillet6
    fillet6_edges = [part.edges().sort_by_distance(p)[0] for p in [
        (-0.700029875, -1.633510522, 1.599999999),
    ]]
    fillet(fillet6_edges, radius=FILLET6_R)


solid = part.part
